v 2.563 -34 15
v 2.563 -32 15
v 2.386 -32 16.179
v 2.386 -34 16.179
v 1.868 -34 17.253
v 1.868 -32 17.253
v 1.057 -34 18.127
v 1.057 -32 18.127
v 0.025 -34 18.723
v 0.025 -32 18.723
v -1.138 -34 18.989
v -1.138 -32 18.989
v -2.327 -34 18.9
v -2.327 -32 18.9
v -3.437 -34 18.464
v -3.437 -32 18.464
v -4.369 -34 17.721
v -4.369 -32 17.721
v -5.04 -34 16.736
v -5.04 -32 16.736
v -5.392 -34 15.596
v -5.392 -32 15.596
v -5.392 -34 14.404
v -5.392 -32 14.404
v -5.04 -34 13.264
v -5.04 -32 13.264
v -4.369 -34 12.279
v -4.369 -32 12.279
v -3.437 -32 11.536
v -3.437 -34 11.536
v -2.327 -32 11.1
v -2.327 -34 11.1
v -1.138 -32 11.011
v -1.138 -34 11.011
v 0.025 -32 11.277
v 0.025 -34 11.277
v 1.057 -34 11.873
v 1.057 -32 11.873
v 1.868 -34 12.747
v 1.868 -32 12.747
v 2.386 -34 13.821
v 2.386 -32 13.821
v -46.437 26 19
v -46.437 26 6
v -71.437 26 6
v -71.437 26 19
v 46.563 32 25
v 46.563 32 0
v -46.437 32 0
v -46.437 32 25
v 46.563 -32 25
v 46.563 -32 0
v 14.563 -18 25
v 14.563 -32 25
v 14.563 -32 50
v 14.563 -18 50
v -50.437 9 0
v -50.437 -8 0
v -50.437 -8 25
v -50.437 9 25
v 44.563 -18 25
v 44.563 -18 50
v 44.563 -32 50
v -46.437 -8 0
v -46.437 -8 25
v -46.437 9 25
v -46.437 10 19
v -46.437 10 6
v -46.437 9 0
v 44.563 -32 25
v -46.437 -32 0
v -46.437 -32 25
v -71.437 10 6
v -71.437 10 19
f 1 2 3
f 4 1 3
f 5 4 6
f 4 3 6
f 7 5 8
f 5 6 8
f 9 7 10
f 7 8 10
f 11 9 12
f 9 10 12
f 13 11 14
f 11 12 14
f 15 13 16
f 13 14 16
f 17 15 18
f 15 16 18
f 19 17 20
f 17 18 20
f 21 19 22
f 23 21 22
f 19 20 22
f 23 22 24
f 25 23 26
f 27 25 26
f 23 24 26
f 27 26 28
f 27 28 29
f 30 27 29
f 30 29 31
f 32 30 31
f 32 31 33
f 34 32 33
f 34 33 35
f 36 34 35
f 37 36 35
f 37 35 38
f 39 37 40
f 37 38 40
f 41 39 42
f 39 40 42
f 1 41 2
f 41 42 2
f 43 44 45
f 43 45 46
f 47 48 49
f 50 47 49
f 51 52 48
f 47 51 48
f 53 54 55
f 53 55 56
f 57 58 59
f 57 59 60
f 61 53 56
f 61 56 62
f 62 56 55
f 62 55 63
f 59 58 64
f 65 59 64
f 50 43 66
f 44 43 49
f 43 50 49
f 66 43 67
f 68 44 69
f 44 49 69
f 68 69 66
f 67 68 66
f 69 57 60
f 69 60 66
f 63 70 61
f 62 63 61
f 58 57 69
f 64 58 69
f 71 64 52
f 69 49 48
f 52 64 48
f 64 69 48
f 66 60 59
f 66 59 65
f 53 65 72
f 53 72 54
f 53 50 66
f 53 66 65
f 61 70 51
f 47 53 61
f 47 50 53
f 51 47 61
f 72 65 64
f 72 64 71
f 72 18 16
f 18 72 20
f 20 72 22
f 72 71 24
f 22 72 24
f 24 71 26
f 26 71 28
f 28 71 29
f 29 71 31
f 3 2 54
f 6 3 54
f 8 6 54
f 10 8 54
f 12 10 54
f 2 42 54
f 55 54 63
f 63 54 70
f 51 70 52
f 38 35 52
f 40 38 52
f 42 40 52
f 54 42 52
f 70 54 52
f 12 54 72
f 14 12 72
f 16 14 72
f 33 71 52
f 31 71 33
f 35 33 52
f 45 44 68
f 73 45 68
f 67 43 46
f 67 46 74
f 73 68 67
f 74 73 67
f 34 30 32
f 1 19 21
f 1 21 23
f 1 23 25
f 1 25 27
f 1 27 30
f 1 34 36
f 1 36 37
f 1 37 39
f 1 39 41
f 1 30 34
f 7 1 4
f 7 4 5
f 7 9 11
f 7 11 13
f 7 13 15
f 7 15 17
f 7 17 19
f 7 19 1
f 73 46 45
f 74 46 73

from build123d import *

# Parameters (mm, degrees)
F0_W     = 4
F0_H     = 17
F1_DEPTH = 25
F2_R     = 4
F3_DEPTH = 2
F4_W     = 30
F4_H     = 14
F5_DEPTH = 25
F6_W     = 16
F6_H     = 13
F7_DEPTH = 25


with BuildPart() as f1:
    # F0 (on Top) → F1 (new body)
    with BuildSketch(Plane.XY):
        Polygon((-46.436612, -32), (46.563388, -32), (46.563388, 32), (-46.436612, 32), (-46.436612, 9), (-46.436612, -8), align=None)
        with Locations((-48.436612, 0.5)):
            Rectangle(F0_W, F0_H)
    extrude(amount=F1_DEPTH)

    # F2 (on face) → F3 (join)
    with BuildSketch(Plane.XZ.offset(32)):
        with Locations((-1.436612, 15)):
            Circle(F2_R)
    extrude(amount=F3_DEPTH)

    # F4 (on face) → F5 (join)
    with BuildSketch(Plane.XY.offset(25)):
        with Locations((29.563388, -25)):
            Rectangle(F4_W, F4_H)
    extrude(amount=F5_DEPTH)

    # F6 (on face) → F7 (join)
    with BuildSketch(Plane(origin=(-46.436612, 0, 0), x_dir=(0, -1, 0), z_dir=(-1, 0, 0))):
        with Locations((-18, 12.5)):
            Rectangle(F6_W, F6_H)
    extrude(amount=F7_DEPTH)


solid = f1.part
